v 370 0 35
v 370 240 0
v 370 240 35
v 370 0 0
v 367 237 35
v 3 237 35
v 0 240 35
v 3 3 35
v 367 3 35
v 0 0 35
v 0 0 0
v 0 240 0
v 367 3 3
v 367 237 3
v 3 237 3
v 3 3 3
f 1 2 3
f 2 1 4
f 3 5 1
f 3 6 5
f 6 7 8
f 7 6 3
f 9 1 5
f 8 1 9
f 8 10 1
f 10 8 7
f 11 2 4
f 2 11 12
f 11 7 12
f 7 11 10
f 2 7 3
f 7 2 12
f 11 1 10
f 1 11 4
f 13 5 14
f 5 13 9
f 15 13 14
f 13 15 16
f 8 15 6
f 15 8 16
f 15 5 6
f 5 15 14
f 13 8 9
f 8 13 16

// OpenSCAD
// ModuDeck donor chassis study: NOT a verified ThinkPad fit.
// Millimetres. 370x240 is an unconfirmed owner measurement.
$fn=32; W=370; D=240; t=3;
module plate(w,d,h){cube([w,d,h]);}
module shell(w,d,h){difference(){cube([w,d,h]);translate([t,t,t])cube([w-2*t,d-2*t,h]);}}
module hole(x,y,h){translate([x,y,-1])cylinder(d=3.4,h=h+2);}
module rail(n){difference(){cube([n,12,6]);for(x=[10:20:n-10])hole(x,6,6);}}
module rear(){difference(){cube([W-6,3,25]);translate([W/2-23,-1,6])cube([40,5,14]);for(x=[10,W-16])translate([x,-1,12])rotate([-90,0,0])cylinder(d=3.4,h=5);}}
module tray(){difference(){shell(W,D,30);translate([3,D-4,3])cube([W-6,6,27]);for(x=[15,W-15],y=[15,D-15])hole(x,y,30);}}
shell(W,D,35);
